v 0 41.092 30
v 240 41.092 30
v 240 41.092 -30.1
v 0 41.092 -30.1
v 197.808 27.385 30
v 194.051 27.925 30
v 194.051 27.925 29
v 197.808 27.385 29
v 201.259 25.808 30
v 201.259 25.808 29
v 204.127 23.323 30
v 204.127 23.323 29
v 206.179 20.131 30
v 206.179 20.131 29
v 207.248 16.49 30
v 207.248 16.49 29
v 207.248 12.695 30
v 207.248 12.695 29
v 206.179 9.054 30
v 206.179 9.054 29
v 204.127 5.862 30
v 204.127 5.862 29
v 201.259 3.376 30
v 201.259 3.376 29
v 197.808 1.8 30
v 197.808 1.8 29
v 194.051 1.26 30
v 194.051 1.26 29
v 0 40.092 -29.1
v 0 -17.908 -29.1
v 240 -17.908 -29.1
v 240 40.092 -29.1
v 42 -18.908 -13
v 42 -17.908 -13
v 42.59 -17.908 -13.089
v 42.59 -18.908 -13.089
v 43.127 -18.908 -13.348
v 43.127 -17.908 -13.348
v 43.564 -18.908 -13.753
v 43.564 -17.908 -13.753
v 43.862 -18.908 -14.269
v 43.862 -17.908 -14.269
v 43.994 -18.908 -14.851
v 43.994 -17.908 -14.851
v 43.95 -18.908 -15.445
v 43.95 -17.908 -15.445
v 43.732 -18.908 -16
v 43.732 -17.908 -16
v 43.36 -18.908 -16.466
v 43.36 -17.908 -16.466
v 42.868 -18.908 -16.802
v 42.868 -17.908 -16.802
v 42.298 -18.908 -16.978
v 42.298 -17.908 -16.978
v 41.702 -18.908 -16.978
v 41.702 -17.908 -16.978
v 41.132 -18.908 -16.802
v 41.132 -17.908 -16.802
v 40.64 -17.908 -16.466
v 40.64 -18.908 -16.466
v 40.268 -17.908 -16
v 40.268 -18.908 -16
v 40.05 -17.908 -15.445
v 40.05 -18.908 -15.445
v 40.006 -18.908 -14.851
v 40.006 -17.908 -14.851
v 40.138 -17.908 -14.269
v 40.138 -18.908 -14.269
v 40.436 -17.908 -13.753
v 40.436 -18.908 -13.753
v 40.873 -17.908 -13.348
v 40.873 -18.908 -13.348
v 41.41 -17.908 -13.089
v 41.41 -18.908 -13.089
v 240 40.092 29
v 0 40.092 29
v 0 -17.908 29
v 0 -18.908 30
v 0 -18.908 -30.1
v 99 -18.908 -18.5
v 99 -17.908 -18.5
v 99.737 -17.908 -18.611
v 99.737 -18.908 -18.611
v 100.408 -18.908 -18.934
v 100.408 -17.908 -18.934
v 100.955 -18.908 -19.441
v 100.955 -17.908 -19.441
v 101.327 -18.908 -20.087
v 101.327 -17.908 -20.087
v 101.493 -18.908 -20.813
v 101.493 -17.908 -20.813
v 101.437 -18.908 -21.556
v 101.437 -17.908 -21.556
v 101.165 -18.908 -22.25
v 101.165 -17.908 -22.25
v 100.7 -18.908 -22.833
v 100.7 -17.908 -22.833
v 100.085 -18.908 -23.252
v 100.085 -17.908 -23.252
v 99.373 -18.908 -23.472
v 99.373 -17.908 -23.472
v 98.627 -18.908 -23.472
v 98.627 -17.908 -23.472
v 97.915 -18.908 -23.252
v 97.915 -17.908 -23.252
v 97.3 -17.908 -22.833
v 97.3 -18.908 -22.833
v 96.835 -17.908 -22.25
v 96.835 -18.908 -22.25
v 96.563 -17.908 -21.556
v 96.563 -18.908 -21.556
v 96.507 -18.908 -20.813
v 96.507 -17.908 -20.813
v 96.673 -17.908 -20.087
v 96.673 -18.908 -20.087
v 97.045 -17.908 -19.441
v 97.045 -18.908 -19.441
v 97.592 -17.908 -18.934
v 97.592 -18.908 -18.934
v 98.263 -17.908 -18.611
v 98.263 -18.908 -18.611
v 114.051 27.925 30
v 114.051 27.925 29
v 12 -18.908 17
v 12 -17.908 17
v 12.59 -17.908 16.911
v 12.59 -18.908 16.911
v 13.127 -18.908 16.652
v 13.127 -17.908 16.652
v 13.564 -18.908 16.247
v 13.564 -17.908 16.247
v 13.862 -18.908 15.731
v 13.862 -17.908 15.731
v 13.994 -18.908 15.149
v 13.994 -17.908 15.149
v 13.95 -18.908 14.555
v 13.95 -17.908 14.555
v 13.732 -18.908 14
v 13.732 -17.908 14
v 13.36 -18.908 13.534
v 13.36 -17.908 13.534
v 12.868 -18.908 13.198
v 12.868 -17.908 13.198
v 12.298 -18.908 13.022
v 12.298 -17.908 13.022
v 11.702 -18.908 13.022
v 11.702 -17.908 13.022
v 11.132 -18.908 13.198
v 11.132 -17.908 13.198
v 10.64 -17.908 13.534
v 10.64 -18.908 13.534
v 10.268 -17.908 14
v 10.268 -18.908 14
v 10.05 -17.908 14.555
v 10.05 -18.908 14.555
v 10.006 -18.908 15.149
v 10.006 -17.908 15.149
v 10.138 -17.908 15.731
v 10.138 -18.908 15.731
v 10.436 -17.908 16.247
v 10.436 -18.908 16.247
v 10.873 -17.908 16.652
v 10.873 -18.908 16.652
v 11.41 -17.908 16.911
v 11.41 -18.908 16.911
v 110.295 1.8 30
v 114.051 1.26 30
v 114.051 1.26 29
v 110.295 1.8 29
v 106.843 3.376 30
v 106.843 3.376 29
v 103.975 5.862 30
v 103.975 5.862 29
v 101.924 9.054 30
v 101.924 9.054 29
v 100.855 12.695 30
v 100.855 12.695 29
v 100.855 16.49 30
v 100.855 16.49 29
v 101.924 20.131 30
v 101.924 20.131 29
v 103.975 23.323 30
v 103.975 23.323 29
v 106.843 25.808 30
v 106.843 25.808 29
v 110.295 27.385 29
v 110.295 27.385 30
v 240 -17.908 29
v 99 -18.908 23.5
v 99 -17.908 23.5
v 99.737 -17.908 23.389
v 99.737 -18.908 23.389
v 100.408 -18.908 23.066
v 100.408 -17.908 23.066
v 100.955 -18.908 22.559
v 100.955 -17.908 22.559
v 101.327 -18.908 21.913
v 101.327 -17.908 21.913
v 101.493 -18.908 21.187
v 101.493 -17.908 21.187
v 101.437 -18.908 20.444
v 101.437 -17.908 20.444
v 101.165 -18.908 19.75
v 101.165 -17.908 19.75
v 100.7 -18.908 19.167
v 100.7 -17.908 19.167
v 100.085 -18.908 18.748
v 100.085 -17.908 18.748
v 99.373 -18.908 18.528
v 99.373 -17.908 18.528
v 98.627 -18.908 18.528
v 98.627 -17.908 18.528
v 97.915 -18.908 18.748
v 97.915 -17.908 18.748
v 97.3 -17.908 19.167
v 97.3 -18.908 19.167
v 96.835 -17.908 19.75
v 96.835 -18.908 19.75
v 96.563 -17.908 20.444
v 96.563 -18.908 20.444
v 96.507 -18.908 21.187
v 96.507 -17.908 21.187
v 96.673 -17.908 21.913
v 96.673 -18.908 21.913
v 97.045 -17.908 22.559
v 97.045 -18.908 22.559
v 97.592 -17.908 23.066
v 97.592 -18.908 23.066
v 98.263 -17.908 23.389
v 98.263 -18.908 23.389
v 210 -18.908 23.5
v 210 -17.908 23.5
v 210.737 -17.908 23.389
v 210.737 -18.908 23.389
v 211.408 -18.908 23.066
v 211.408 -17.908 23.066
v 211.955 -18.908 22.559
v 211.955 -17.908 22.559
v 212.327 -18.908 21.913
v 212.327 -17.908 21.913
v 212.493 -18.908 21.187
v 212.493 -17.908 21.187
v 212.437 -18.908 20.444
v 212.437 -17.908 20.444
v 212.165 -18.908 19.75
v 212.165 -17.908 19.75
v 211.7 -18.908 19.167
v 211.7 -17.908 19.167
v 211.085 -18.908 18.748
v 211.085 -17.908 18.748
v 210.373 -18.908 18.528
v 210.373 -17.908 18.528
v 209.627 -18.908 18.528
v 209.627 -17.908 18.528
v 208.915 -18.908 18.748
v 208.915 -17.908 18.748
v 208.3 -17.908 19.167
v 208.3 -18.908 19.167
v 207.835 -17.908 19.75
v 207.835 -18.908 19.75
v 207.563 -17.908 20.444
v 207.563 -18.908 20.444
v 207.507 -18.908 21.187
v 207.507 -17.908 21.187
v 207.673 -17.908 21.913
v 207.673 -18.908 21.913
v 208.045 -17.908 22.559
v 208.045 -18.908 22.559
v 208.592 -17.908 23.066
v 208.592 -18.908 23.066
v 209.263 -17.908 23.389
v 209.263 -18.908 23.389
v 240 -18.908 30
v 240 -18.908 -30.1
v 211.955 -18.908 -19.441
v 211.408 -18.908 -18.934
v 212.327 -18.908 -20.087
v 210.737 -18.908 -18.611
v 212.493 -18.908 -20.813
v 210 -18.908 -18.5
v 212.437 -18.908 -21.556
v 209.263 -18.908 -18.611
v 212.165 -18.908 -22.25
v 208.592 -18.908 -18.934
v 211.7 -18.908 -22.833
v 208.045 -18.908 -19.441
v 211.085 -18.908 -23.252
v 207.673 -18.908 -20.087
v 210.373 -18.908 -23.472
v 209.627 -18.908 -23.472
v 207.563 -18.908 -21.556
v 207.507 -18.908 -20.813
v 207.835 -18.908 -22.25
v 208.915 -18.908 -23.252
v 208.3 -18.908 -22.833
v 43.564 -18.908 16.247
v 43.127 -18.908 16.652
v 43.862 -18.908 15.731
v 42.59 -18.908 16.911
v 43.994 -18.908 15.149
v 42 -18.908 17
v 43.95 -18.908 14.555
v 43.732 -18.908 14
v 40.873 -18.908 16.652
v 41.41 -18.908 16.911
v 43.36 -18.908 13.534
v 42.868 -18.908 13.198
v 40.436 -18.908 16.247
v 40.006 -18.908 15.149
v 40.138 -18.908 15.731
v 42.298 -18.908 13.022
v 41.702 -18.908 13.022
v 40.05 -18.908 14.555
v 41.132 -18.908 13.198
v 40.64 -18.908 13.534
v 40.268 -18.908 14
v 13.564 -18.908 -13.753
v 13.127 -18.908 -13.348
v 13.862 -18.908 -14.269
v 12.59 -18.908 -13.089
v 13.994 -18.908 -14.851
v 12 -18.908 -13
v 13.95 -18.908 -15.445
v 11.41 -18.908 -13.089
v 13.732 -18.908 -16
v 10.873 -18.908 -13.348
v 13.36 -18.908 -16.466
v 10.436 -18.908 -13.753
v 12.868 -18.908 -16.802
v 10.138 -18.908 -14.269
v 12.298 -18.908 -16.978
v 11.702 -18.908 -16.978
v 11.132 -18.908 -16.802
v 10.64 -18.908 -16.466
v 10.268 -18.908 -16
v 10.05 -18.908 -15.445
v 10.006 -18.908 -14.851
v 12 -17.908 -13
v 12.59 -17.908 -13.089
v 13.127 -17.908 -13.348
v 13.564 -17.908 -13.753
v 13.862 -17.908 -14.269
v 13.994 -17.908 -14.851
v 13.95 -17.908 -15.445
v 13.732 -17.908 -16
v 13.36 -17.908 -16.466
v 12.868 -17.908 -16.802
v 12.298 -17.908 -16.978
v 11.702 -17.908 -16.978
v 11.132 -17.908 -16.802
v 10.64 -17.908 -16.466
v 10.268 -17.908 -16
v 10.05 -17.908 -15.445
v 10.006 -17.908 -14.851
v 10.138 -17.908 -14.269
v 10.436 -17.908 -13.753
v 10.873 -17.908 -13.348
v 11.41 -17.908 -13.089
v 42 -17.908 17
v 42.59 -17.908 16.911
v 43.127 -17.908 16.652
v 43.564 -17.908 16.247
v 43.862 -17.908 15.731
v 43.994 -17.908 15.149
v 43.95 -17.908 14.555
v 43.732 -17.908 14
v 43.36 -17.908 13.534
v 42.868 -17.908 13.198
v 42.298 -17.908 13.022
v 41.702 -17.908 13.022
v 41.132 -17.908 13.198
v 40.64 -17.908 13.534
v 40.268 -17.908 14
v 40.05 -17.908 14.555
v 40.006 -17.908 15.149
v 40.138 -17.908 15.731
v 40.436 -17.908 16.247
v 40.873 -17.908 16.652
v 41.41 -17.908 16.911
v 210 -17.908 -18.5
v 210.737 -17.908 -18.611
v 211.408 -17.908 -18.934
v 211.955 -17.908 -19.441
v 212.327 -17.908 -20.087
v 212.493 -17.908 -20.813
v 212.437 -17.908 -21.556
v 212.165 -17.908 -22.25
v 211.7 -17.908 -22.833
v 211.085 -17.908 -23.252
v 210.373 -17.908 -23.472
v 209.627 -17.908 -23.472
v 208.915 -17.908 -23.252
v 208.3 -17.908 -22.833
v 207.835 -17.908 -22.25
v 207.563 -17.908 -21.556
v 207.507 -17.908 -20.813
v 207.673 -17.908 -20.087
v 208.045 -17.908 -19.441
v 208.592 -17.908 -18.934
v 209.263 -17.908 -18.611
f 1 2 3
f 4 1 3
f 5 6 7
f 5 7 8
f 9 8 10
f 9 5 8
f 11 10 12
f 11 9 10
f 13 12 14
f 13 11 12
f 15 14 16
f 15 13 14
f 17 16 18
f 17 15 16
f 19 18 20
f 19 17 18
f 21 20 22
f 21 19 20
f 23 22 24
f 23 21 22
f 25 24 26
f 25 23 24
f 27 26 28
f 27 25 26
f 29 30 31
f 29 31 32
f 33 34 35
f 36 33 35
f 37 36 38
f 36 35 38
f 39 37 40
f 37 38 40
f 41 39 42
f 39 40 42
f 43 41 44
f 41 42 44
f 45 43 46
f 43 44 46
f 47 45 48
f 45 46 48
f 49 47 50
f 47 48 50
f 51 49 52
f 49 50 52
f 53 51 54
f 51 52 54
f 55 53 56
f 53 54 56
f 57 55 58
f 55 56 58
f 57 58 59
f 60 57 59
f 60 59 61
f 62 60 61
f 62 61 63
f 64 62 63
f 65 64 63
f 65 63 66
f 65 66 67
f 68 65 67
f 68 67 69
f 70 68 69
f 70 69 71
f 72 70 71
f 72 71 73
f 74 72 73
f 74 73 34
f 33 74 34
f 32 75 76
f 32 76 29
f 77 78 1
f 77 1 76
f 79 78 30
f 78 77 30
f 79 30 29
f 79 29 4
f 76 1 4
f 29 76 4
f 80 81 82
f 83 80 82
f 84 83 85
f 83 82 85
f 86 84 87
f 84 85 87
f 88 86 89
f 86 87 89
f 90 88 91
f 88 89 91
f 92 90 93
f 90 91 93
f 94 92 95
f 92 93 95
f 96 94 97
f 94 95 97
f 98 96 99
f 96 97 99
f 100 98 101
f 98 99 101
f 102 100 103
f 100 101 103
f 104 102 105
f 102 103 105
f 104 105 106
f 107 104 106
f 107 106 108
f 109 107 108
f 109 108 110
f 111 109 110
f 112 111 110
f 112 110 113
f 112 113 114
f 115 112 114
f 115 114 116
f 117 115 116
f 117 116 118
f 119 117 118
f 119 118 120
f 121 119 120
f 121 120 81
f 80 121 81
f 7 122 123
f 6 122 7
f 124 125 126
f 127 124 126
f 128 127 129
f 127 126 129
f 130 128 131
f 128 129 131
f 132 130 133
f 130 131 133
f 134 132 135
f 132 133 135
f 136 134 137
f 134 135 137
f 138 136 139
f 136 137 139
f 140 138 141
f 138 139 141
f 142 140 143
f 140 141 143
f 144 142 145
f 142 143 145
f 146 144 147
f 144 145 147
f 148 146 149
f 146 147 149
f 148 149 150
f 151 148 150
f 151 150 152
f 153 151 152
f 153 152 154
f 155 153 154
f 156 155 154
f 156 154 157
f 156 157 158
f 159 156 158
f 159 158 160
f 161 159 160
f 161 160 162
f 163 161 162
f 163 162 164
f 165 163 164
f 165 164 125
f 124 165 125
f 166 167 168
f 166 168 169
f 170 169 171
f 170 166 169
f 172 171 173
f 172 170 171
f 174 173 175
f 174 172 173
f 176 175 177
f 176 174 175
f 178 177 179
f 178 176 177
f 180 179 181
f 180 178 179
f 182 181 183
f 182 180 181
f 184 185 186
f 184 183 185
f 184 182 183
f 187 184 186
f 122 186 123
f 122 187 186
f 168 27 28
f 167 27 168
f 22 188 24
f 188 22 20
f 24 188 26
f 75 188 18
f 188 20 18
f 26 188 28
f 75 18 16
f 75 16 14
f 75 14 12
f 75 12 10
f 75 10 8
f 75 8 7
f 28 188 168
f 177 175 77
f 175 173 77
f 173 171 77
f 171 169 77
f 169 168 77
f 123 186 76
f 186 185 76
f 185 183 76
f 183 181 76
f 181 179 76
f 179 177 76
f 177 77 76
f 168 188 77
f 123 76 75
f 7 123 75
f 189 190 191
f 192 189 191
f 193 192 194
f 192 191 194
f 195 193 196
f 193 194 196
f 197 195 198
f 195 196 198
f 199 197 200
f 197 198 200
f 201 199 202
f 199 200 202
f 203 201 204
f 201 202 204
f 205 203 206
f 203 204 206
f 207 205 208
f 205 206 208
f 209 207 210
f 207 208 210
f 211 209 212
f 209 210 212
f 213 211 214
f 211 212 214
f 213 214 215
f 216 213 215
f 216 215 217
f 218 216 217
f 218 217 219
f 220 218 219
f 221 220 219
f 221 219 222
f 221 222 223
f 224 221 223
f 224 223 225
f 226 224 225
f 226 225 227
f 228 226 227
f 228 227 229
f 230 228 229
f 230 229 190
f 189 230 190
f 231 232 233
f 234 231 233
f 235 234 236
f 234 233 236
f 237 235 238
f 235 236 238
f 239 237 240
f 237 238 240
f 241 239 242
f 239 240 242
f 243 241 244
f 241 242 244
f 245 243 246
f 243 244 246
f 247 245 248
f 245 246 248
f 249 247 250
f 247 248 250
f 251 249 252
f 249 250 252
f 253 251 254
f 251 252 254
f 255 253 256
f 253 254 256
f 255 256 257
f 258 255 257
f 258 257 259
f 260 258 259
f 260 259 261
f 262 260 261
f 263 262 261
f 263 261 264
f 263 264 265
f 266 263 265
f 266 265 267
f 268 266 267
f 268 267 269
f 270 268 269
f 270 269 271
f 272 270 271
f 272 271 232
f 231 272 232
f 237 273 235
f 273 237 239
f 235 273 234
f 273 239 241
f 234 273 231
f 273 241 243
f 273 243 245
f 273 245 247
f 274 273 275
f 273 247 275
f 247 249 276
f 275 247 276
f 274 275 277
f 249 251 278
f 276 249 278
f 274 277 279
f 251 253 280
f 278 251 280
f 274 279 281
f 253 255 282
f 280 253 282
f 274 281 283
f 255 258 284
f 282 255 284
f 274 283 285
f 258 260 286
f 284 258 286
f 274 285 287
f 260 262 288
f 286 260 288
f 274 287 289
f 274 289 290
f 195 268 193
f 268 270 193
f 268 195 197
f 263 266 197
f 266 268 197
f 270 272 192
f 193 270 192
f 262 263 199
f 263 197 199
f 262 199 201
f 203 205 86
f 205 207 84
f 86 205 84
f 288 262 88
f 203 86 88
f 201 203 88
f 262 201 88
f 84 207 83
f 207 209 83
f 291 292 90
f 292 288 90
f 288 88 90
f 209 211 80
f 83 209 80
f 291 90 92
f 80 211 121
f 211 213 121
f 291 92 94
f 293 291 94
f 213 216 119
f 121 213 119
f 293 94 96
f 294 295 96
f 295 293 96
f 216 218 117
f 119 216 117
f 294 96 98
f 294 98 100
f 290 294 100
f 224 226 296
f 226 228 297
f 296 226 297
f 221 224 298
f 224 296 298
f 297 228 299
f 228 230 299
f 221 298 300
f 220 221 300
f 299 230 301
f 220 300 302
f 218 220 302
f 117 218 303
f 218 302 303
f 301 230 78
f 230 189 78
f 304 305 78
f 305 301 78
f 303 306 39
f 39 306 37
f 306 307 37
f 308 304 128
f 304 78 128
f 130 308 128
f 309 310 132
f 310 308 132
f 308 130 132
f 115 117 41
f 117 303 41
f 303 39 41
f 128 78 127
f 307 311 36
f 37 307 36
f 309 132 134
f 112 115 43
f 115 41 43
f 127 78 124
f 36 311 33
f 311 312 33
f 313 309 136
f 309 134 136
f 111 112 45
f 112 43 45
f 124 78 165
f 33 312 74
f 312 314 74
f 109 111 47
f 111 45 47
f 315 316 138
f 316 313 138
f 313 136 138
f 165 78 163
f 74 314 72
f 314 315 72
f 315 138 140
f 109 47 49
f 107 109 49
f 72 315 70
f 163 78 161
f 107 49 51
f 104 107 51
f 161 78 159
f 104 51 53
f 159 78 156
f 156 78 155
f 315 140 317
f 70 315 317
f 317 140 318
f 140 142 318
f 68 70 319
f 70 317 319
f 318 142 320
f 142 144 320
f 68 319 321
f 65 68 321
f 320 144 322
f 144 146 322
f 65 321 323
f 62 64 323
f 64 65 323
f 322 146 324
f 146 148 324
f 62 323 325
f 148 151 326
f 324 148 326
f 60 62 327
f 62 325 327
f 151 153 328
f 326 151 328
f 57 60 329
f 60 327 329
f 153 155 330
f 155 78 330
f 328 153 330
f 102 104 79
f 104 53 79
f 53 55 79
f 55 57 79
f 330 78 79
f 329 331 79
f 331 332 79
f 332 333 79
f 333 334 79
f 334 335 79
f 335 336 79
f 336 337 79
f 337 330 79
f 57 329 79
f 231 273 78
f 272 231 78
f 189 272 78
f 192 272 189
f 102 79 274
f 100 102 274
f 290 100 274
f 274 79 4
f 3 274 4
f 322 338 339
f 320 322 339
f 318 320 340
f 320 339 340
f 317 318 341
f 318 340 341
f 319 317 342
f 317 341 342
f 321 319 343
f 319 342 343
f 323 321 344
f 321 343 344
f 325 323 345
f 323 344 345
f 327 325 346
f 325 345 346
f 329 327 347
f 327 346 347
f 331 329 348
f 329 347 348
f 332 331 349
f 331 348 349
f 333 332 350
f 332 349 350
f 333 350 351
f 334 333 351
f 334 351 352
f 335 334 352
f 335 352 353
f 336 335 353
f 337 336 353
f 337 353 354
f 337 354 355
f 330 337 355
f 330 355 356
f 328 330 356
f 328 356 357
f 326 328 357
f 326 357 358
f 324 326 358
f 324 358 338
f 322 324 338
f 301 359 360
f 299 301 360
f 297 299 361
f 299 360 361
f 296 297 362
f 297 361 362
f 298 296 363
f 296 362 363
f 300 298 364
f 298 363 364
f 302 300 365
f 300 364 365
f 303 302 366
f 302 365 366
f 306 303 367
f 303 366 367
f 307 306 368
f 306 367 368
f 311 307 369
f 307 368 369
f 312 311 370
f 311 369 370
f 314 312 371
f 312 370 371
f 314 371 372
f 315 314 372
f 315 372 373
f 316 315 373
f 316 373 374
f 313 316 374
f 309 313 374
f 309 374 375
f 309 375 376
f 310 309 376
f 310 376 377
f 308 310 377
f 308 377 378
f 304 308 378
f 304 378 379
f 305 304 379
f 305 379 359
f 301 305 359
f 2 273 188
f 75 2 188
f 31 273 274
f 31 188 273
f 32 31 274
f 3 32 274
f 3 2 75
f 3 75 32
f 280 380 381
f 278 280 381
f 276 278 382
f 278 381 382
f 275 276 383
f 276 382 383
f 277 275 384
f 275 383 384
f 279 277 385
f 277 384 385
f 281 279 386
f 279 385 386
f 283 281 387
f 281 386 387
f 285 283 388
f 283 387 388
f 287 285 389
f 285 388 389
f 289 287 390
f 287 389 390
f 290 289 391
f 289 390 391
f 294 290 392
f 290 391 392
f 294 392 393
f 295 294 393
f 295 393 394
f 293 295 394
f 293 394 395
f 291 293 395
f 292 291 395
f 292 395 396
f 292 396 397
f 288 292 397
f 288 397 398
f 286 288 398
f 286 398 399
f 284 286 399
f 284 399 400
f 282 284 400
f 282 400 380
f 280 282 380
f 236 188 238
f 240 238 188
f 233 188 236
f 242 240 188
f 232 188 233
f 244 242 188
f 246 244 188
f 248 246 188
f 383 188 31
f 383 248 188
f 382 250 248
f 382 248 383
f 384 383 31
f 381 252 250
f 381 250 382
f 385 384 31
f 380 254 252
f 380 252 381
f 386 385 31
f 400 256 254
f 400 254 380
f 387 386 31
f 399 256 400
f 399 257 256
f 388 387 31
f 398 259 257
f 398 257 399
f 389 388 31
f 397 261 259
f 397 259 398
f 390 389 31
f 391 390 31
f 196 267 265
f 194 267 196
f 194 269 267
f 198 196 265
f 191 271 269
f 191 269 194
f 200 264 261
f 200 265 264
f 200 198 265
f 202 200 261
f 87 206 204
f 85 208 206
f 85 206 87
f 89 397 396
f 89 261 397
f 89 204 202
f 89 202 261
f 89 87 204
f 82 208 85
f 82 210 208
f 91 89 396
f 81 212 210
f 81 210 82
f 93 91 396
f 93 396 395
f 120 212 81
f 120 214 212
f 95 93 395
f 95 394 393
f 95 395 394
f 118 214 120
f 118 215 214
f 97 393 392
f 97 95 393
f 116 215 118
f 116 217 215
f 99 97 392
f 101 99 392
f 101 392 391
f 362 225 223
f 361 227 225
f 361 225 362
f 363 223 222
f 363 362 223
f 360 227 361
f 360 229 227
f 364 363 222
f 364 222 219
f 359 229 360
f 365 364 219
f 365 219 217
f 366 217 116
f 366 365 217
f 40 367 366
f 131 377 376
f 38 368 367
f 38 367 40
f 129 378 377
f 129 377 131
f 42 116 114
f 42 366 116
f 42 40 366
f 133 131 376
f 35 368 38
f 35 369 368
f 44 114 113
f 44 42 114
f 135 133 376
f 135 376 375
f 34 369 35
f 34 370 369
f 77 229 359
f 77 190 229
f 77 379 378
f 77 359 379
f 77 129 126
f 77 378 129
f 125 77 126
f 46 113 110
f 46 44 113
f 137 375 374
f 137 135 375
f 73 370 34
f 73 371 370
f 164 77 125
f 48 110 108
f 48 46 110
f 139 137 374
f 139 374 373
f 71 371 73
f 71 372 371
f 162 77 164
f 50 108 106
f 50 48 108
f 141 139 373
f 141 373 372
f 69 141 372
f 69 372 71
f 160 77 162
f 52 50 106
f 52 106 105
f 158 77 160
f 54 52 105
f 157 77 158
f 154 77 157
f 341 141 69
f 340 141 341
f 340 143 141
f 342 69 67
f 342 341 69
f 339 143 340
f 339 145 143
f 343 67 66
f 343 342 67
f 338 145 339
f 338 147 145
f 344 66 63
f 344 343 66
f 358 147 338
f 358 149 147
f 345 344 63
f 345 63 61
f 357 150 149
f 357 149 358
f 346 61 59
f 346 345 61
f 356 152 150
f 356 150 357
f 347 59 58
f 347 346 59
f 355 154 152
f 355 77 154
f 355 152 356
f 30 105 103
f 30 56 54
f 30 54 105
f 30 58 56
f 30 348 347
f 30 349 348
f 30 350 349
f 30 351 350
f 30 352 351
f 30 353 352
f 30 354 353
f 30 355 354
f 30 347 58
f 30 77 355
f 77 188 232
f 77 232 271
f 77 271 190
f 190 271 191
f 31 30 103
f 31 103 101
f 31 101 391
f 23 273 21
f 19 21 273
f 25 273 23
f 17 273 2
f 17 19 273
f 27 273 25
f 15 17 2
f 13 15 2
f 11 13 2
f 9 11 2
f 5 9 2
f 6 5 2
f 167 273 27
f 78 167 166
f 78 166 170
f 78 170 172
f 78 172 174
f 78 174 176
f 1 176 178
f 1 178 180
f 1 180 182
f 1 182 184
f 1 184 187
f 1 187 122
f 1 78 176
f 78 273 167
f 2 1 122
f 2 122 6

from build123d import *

# Parameters (mm, degrees)
ESBO_O2_W                = 60.1
ESBO_O2_H                = 60
ESBO_O2_W_2              = 58.1
ESBO_O2_H_2              = 58
RESSALTO_EXTRUS_O3_DEPTH = 240
ESBO_O4_R                = 2
ESBO_O4_R_2              = 2.5
CORTE_EXTRUS_O1_DEPTH    = 246.345874994
CORTE_EXTRUS_O2_DEPTH    = 10


with BuildPart() as part:
    # Esboço2 → Ressalto-extrusão3 (new body)
    with BuildSketch(Plane(origin=(0, 0, 0), x_dir=(0, 0, -1), z_dir=(1, 0, 0))):
        with Locations((0.05, 11.092436975)):
            Rectangle(ESBO_O2_W, ESBO_O2_H)
        with Locations((0.05, 11.092436975)):
            Rectangle(ESBO_O2_W_2, ESBO_O2_H_2, mode=Mode.SUBTRACT)
    extrude(amount=RESSALTO_EXTRUS_O3_DEPTH)

    # Esboço4 → Corte-extrusão1 (cut, through all)
    with BuildSketch(Plane(origin=(0, 0, 0), x_dir=(1, 0, 0), z_dir=(0, 1, 0))):
        with Locations(Location((12, 15, 0), (0, 0, 270))):
            Circle(ESBO_O4_R)
        with Locations(Location((12, -15, 0), (0, 0, 270))):
            Circle(ESBO_O4_R)
        with Locations(Location((42, -15, 0), (0, 0, 270))):
            Circle(ESBO_O4_R)
        with Locations(Location((42, 15, 0), (0, 0, 270))):
            Circle(ESBO_O4_R)
        with Locations(Location((210, -21, 0), (0, 0, 270))):
            Circle(ESBO_O4_R_2)
        with Locations(Location((210, 21, 0), (0, 0, 270))):
            Circle(ESBO_O4_R_2)
        with Locations(Location((99, -21, 0), (0, 0, 270))):
            Circle(ESBO_O4_R_2)
        with Locations(Location((99, 21, 0), (0, 0, 270))):
            Circle(ESBO_O4_R_2)
    extrude(amount=-CORTE_EXTRUS_O1_DEPTH, mode=Mode.SUBTRACT)

    # Esboço5 → Corte-extrusão2 (cut)
    with BuildSketch(Plane.XY.offset(30)):
        with BuildLine():
            Line((194.051333541, 1.259947871), (114.051333541, 1.259947871))
            ThreePointArc((114.051333541, 1.259947871), (100.718844437, 14.592436975), (114.051333541, 27.924926079))
            Line((114.051333541, 27.924926079), (194.051333541, 27.924926079))
            ThreePointArc((194.051333541, 27.924926079), (207.383822645, 14.592436975), (194.051333541, 1.259947871))
        make_face()
    extrude(amount=-CORTE_EXTRUS_O2_DEPTH, mode=Mode.SUBTRACT)


solid = part.part
